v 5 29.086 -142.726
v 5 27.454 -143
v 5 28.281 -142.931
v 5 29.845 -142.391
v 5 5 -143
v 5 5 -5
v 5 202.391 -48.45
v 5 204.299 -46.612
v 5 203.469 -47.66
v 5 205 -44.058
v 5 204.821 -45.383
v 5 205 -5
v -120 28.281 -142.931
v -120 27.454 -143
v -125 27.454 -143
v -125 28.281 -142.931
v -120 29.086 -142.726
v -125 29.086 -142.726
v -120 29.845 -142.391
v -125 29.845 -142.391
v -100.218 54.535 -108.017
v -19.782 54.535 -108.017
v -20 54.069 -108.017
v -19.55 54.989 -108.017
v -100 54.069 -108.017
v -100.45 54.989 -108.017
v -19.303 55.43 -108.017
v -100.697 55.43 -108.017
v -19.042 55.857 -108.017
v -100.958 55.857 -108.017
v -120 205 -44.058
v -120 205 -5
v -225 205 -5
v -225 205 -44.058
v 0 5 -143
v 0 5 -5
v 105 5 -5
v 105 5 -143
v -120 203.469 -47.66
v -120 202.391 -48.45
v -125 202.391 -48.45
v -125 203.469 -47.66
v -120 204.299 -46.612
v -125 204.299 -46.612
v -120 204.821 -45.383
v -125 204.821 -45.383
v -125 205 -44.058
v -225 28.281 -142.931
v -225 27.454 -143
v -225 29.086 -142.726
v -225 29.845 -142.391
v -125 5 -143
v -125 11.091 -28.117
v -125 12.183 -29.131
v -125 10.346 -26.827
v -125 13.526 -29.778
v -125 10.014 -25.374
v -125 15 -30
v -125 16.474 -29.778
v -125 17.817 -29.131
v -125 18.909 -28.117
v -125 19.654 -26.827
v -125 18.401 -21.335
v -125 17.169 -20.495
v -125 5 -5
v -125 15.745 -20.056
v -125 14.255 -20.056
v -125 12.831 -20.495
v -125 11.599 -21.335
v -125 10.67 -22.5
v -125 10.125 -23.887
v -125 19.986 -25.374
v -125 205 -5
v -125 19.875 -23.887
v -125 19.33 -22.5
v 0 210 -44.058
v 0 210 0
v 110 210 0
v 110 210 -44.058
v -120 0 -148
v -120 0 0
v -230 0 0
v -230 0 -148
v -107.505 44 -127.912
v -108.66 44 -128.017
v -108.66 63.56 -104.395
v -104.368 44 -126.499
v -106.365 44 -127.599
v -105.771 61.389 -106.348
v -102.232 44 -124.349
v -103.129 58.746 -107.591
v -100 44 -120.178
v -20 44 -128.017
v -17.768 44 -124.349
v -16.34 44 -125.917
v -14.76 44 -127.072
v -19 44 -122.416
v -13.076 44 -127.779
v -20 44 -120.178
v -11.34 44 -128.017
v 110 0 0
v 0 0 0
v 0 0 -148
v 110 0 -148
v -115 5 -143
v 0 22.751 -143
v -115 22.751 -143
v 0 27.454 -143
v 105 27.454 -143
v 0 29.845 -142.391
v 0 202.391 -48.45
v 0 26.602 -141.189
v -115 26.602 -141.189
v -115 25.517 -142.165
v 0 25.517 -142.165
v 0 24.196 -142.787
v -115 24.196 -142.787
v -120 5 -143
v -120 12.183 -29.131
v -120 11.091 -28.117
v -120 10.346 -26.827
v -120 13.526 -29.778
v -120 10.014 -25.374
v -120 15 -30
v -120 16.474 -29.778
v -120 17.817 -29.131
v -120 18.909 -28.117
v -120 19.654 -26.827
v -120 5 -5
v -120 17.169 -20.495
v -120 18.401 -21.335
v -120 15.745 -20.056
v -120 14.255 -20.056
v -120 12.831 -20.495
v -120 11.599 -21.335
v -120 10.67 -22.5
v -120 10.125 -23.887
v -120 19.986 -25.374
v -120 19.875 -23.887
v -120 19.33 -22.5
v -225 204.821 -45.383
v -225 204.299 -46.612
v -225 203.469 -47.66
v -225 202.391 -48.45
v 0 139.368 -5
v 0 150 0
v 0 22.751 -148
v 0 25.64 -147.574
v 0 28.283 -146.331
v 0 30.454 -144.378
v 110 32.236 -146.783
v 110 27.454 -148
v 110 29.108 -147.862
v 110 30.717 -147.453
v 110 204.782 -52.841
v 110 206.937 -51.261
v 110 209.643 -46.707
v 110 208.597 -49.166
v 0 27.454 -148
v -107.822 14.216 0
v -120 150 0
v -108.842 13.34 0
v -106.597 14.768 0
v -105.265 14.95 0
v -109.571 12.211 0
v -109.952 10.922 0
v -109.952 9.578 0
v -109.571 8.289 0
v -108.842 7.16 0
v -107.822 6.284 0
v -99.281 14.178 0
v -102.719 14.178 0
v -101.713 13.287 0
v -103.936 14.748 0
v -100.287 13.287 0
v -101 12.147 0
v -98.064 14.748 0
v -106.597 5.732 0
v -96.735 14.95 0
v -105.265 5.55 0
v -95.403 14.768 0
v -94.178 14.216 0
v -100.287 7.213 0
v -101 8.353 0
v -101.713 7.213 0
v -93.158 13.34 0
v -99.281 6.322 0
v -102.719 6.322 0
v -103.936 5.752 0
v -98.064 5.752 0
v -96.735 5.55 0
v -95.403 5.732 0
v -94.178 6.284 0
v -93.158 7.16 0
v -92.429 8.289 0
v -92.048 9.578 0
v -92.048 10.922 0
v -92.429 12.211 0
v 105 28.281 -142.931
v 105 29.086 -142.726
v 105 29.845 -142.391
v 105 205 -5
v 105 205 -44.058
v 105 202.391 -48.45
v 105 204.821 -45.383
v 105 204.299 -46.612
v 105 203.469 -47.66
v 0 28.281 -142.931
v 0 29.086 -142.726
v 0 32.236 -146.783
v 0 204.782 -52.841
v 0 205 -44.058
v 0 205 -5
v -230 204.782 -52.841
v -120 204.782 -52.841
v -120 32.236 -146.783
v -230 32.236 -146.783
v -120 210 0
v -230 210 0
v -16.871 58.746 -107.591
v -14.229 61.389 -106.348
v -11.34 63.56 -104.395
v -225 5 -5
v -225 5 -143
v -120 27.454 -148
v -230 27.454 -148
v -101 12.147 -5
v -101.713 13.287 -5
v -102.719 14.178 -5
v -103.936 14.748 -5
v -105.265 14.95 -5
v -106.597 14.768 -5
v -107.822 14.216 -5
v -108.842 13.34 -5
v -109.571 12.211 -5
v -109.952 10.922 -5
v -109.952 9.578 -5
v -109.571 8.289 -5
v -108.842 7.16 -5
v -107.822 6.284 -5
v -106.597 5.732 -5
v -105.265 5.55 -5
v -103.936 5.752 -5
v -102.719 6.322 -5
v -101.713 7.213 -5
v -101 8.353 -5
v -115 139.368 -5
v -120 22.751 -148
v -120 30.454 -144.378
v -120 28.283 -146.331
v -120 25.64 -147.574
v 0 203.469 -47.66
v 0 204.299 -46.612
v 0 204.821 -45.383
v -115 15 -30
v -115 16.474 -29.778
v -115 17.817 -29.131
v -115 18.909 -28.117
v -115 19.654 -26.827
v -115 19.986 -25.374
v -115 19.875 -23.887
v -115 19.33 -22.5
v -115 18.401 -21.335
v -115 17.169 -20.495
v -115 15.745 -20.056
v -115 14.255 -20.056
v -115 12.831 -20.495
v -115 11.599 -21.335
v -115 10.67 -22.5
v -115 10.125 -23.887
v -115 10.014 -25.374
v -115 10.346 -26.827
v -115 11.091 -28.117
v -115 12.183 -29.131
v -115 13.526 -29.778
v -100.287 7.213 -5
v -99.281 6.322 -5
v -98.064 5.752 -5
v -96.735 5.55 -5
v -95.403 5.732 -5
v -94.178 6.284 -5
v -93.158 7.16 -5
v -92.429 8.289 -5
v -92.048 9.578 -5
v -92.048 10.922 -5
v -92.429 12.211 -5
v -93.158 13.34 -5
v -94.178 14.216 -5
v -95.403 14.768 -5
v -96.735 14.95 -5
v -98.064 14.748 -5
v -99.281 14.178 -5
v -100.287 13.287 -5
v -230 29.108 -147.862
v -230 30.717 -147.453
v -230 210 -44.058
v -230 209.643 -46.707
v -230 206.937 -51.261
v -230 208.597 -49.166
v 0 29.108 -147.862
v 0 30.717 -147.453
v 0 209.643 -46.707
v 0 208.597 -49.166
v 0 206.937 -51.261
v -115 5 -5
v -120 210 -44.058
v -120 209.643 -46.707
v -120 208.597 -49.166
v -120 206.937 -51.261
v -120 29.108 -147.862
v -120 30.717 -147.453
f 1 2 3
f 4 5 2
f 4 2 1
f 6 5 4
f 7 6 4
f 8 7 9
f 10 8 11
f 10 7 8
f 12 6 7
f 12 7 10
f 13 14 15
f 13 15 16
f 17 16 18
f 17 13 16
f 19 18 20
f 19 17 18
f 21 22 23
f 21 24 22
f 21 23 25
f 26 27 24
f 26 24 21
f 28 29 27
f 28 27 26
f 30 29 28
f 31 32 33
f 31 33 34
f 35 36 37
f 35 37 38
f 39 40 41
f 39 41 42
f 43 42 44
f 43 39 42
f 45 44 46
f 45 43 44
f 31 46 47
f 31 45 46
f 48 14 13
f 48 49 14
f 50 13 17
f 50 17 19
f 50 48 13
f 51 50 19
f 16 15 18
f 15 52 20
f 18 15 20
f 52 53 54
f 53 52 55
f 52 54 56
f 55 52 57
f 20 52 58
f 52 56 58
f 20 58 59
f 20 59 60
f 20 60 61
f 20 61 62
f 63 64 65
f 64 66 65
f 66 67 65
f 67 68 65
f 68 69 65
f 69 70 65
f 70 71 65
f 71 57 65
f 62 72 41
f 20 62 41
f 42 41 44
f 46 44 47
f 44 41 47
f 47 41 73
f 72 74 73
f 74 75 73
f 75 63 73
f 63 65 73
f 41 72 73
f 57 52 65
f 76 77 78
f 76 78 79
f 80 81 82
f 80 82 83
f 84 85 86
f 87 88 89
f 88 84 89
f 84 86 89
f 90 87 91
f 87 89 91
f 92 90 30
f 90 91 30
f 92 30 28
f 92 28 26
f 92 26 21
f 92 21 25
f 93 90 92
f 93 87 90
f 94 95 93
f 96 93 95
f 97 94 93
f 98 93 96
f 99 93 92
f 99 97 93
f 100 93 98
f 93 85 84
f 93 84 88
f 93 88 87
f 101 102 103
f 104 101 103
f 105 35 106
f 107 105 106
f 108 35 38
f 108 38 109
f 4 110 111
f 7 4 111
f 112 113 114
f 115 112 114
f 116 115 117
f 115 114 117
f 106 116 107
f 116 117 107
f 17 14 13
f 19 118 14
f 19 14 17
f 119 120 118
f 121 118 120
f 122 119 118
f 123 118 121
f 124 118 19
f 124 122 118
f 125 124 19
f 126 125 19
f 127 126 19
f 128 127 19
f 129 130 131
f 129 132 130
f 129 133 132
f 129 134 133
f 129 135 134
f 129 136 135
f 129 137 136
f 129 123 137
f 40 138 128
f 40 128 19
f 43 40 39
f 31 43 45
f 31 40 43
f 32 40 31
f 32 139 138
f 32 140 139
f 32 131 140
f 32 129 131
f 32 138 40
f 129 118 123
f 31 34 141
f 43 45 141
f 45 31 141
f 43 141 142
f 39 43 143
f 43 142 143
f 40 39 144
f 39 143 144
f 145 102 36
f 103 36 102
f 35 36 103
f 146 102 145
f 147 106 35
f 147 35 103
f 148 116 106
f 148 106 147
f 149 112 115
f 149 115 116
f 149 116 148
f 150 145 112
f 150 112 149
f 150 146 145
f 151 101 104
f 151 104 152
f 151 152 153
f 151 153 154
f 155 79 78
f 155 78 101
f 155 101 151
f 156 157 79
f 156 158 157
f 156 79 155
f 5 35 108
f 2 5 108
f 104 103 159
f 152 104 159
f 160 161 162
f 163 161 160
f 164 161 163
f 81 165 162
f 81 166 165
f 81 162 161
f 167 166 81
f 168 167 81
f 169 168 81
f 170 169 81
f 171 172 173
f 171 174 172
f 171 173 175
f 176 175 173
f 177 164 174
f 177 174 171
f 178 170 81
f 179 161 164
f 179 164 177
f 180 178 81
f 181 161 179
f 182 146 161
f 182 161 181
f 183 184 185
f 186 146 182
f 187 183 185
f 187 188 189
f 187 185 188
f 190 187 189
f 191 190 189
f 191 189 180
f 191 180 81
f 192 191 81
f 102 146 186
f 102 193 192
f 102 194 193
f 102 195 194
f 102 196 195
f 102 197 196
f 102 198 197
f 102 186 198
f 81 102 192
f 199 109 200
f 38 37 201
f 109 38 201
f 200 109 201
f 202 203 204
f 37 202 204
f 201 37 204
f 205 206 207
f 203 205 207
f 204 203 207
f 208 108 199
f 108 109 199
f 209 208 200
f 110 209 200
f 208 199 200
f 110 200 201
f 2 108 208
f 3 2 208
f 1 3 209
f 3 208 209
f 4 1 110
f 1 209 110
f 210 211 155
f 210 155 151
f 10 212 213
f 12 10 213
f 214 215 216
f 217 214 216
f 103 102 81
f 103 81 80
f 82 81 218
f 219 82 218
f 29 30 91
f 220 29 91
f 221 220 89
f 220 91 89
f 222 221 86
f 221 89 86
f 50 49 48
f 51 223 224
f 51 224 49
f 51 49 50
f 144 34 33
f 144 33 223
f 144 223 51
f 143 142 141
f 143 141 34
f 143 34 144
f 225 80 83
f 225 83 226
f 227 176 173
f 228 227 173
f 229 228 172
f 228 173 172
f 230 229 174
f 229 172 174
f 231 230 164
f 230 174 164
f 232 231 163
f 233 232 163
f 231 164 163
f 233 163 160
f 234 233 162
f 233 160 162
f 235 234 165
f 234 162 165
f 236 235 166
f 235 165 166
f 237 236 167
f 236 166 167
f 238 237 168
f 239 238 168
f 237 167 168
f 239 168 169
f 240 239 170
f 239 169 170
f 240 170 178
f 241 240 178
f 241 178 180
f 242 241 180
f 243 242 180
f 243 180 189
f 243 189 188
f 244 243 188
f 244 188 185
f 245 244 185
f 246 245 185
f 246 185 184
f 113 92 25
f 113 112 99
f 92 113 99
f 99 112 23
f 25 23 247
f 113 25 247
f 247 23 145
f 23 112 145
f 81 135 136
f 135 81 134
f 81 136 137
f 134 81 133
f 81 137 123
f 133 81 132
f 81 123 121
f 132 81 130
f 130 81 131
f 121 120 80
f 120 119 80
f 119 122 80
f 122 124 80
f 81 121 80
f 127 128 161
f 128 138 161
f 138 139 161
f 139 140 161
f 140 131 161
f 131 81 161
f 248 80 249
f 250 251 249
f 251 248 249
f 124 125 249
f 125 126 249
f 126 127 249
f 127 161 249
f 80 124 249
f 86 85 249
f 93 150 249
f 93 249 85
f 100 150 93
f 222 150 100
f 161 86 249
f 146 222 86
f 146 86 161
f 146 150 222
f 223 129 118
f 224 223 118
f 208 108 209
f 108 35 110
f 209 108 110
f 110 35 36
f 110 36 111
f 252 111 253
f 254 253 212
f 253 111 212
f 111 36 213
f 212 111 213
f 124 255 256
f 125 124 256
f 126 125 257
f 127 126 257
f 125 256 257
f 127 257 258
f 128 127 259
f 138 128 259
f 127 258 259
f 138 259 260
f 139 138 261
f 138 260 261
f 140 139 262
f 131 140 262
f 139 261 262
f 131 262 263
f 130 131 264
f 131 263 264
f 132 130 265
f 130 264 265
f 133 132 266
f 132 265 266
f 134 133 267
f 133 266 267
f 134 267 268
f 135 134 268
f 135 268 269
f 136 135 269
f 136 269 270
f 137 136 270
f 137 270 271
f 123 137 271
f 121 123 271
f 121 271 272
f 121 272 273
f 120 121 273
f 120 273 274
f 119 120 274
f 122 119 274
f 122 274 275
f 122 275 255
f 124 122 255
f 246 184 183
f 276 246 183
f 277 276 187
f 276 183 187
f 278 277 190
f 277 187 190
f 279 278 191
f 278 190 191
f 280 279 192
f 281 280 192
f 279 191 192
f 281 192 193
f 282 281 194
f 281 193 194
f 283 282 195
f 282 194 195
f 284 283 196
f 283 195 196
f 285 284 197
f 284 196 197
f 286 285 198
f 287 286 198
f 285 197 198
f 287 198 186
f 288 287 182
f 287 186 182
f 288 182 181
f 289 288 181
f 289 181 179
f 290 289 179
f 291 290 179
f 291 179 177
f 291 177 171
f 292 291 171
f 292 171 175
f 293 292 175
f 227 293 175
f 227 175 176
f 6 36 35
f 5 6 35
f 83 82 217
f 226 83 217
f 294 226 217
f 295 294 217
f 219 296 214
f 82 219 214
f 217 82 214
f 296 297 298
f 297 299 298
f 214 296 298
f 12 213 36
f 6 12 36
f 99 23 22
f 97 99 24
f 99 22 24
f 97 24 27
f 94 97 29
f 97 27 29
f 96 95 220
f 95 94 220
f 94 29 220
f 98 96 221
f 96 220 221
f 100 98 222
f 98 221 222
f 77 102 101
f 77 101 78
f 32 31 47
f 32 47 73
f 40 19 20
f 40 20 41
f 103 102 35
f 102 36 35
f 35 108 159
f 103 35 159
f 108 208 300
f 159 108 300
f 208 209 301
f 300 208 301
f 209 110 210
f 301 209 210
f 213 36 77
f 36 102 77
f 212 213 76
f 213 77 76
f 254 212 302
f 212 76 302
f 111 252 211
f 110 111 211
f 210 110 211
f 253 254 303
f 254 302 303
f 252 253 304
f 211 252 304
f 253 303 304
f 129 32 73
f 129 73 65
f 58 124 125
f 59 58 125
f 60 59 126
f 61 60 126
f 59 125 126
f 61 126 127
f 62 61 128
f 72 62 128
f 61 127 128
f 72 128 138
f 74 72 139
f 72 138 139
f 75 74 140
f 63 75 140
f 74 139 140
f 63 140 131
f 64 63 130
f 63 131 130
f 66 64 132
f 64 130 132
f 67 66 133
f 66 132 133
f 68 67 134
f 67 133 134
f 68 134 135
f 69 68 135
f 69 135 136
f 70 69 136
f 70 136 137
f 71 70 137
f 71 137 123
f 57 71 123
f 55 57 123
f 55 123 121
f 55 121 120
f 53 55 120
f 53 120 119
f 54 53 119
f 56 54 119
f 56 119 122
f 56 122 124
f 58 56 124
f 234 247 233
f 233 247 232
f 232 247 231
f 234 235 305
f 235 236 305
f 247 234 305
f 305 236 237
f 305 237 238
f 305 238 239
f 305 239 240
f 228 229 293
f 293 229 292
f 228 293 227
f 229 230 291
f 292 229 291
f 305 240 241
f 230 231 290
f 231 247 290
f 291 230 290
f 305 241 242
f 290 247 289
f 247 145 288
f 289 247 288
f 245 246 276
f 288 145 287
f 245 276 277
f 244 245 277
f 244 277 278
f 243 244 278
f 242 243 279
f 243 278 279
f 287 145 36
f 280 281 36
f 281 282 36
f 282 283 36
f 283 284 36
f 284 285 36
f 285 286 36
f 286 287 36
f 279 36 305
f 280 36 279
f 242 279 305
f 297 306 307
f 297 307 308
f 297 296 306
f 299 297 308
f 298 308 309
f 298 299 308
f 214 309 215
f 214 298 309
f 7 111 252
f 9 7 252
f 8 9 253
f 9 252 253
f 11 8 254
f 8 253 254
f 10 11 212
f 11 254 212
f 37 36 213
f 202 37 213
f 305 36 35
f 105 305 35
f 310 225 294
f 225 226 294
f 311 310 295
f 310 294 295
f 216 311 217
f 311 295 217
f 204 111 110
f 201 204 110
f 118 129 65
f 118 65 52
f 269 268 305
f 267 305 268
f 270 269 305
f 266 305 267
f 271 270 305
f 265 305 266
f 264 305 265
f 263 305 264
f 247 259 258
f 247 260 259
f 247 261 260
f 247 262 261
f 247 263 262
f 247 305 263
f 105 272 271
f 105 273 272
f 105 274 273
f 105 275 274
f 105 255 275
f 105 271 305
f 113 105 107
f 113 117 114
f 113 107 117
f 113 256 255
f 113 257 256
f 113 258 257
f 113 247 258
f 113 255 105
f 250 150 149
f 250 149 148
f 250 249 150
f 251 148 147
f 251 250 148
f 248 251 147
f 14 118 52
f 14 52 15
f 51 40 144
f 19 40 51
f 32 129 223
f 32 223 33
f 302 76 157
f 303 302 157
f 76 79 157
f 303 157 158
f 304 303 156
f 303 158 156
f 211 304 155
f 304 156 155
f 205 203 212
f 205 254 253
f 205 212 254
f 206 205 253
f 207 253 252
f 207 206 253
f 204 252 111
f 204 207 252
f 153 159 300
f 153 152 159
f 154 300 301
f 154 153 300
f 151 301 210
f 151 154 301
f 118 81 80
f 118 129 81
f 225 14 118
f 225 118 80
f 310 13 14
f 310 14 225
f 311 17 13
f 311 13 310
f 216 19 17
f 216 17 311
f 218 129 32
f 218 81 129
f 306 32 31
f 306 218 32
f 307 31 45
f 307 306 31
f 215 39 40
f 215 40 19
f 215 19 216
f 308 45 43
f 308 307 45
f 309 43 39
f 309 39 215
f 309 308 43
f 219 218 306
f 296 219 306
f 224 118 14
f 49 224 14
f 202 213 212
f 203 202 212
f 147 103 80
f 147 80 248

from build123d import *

# Parameters (mm, degrees)
SKETCH1_W               = 148
SKETCH1_H               = 210
BOSS_EXTRUDE1_DEPTH     = 110
SPLIT1_SURFACE_1_BACK   = 280.471
SPLIT1_SURFACE_1_DEPTH  = 560.942
FILLET1_R               = 10
SHELL2_T                = -5
THICKEN1_DEPTH          = 5
BOSS_EXTRUDE2_DEPTH     = 120
FILLET2_R               = 10
SHELL3_T                = -5
SKETCH4_R               = 5
CUT_EXTRUDE1_DEPTH      = 10
CUT_EXTRUDE2_DEPTH      = 5
CUT_EXTRUDE3_DEPTH      = 40
CUT_EXTRUDE3_DEPTH_BACK = 40
FILLET3_R               = 10


# Read off the part's stored shape, not the designer's step: Thicken1
with BuildPart() as part:
    # Sketch1 → Boss-Extrude1 (new body)
    with BuildSketch(Plane(origin=(0, 0, 0), x_dir=(0, 0, -1), z_dir=(1, 0, 0))):
        with Locations((74, 105)):
            Rectangle(SKETCH1_W, SKETCH1_H)
    extrude(amount=BOSS_EXTRUDE1_DEPTH)

    # Split1: cut with a surface, the side behind it stays
    # Split1 surface: a surface, the sketch's curves swept straight by 560.942 mm
    with BuildLine(Plane(origin=(110, 0, 0), x_dir=(0, 0, -1), z_dir=(1, 0, 0)).offset(-SPLIT1_SURFACE_1_BACK), mode=Mode.PRIVATE) as split1_surface_1_path:
        Line((50, 210), (148, 30))
    split1_surface_1 = Shell.extrude(split1_surface_1_path.wire(), (1 * SPLIT1_SURFACE_1_DEPTH, 0 * SPLIT1_SURFACE_1_DEPTH, 0 * SPLIT1_SURFACE_1_DEPTH))
    split(bisect_by=split1_surface_1, keep=Keep.BOTTOM)

    # Fillet1
    fillet1_edges = [part.edges().sort_by_distance(p)[0] for p in [
        (55, 210, -50),
        (55, 30, -148),
    ]]
    fillet(fillet1_edges, radius=FILLET1_R)

    # Shell2
    shell2_openings = [part.faces().sort_by_distance(p)[0] for p in [
        (0, 87.139420884, -57.622655137),
    ]]
    offset(amount=SHELL2_T, openings=shell2_openings, kind=Kind.INTERSECTION)


with BuildPart() as body_2:
    # Thicken1 outline → Thicken1 (new body)
    with BuildSketch(Plane.YZ):
        with BuildLine():
            ThreePointArc((27.454206726, -143), (28.68775727, -142.845446631), (29.845048058, -142.391341222))
            Line((29.845048058, -142.391341222), (202.390841332, -48.449742661))
            ThreePointArc((202.390841332, -48.449742661), (204.298500126, -46.612397656), (205, -44.05840144))
            Line((205, -44.05840144), (205, -5))
            Line((205, -5), (5, -5))
            Line((5, -5), (5, -143))
            Line((5, -143), (27.454206726, -143))
        make_face()
    extrude(amount=THICKEN1_DEPTH)


with BuildPart() as body_3:
    # Mirror1: mirrored copy
    add(part.part.mirror(Plane(origin=(-60, 0, 0), x_dir=(0, 0, 1), z_dir=(1, 0, 0))))


with BuildPart() as body_4:
    # Mirror1 2: mirrored copy
    add(body_2.part.mirror(Plane(origin=(-60, 0, 0), x_dir=(0, 0, 1), z_dir=(1, 0, 0))))


with BuildPart() as body_5:
    # Sketch3 → Boss-Extrude2 (new body)
    with BuildSketch(Plane.ZY):
        Polygon((-148, 27.454206726), (0, 150), (0, 0), (-148, 0), align=None)
    extrude(amount=BOSS_EXTRUDE2_DEPTH)

    # Fillet2
    fillet2_edges = [body_5.edges().sort_by_distance(p)[0] for p in [
        (-60, 27.454206726, -148),
    ]]
    fillet(fillet2_edges, radius=FILLET2_R)

    # Shell3
    shell3_openings = [body_5.faces().sort_by_distance(p)[0] for p in [
        (0, 51.421511448, -56.944660016),
    ]]
    offset(amount=SHELL3_T, openings=shell3_openings, kind=Kind.INTERSECTION)


with BuildPart() as cut_extrude1_tool:
    # Sketch4 → Cut-Extrude1 (new body)
    with BuildSketch(Plane(origin=(-115, 0, 0), x_dir=(0, 0, -1), z_dir=(1, 0, 0))):
        with Locations((25, 15)):
            Circle(SKETCH4_R)
    extrude(amount=-CUT_EXTRUDE1_DEPTH)


with BuildPart() as body_4_1:
    add(body_4.part)

    # Cut-Extrude1: cut by cut_extrude1_tool
    add(cut_extrude1_tool.part, mode=Mode.SUBTRACT)


with BuildPart() as body_5_1:
    add(body_5.part)

    # Cut-Extrude1: cut by cut_extrude1_tool
    add(cut_extrude1_tool.part, mode=Mode.SUBTRACT)

    # Sketch5 → Cut-Extrude2 (cut)
    with BuildSketch(Plane.XY):
        with BuildLine():
            ThreePointArc((-101, 12.147366596), (-110, 10.25), (-101, 8.352633404))
            ThreePointArc((-101, 8.352633404), (-92, 10.25), (-101, 12.147366596))
        make_face()
    extrude(amount=-CUT_EXTRUDE2_DEPTH, mode=Mode.SUBTRACT)

    # Sketch7 → Cut-Extrude3 (cut, two sides: drawn at the far end of the back side and taken through both)
    with BuildSketch(Plane(origin=(-60, 0, 0), x_dir=(0, 0, -1), z_dir=(1, 0, 0)).offset(-CUT_EXTRUDE3_DEPTH_BACK)):
        Polygon((128.0174503, 44), (108.0174503, 44), (108.0174503, 60.560242334), align=None)
    extrude(amount=CUT_EXTRUDE3_DEPTH + CUT_EXTRUDE3_DEPTH_BACK, mode=Mode.SUBTRACT)

    # Fillet3
    # the kernel refuses this fillet: 10 mm, written as the material it takes off along each edge
    with BuildSketch(Plane(origin=(-100, 74.368203197, -91.341413097), x_dir=(-1, 0, 0), z_dir=(0, -0.6377623937017006, -0.77023316546347))) as fillet3_piece_1_section:
        with BuildLine():
            CenterArc((8.660254038, -10), FILLET3_R, 90, 60)
            Line((0, -5), (-0.173205081, -4.9))
            ThreePointArc((-0.173205081, -4.9), (-0.2, -2.5), (-0.2, 0))
            Line((-0.2, 0), (0, 0.2))
            Line((0, 0.2), (8.660254038, 0.2))
            Line((8.660254038, 0.2), (8.660254038, 0))
        make_face()
    fillet3_piece_1 = extrude(amount=69.26743329, mode=Mode.PRIVATE)
    fillet3_piece_1 = split(fillet3_piece_1, bisect_by=Plane(origin=(-102.283215667, 51.522014341, -108.0174503), z_dir=(0, 0, -1)), keep=Keep.TOP, mode=Mode.PRIVATE)
    fillet3_piece_1 = split(fillet3_piece_1, bisect_by=Plane(origin=(-102.283215667, 44, -117.101875744), z_dir=(0, 1, 0)), keep=Keep.TOP, mode=Mode.PRIVATE)
    with BuildSketch(Plane(origin=(-20, 74.368203197, -91.341413097), x_dir=(1, 0, 0), z_dir=(0, -0.6377623937017006, -0.77023316546347))) as fillet3_piece_2_section:
        with BuildLine():
            CenterArc((8.660254038, 10), FILLET3_R, 210, 60)
            Line((0, 5), (-0.173205081, 4.9))
            ThreePointArc((-0.173205081, 4.9), (-0.2, 2.5), (-0.2, 0))
            Line((-0.2, 0), (0, -0.2))
            Line((0, -0.2), (8.660254038, -0.2))
            Line((8.660254038, -0.2), (8.660254038, 0))
        make_face()
    fillet3_piece_2 = extrude(amount=69.26743329, mode=Mode.PRIVATE)
    fillet3_piece_2 = split(fillet3_piece_2, bisect_by=Plane(origin=(-17.716784333, 51.522014341, -108.0174503), z_dir=(0, 0, -1)), keep=Keep.TOP, mode=Mode.PRIVATE)
    fillet3_piece_2 = split(fillet3_piece_2, bisect_by=Plane(origin=(-17.716784333, 44, -117.101875744), z_dir=(0, 1, 0)), keep=Keep.TOP, mode=Mode.PRIVATE)
    with BuildSketch(Plane(origin=(-100, 60.560242334, -108.0174503), x_dir=(0, 0.6377623937017001, 0.7702331654634703), z_dir=(1, 0, 0))) as fillet3_piece_3:
        with BuildLine():
            CenterArc((FILLET3_R * 0.470296038318, FILLET3_R), FILLET3_R, 219.625168474, 50.374831526)
            Line((-FILLET3_R * 0.299937127146, FILLET3_R * 0.362237606298), (-FILLET3_R * 0.315341790455, FILLET3_R * 0.349482358424))
            Line((-FILLET3_R * 0.315341790455, FILLET3_R * 0.349482358424), (-FILLET3_R * 0.00940592076635, -FILLET3_R * 0.02))
            Line((-FILLET3_R * 0.00940592076635, -FILLET3_R * 0.02), (FILLET3_R * 0.470296038318, -FILLET3_R * 0.02))
            Line((FILLET3_R * 0.470296038318, -FILLET3_R * 0.02), (FILLET3_R * 0.470296038318, 0))
        make_face()
    fillet3_piece_3_solid = extrude(amount=80, mode=Mode.PRIVATE)
    with BuildSketch(Plane(origin=(-100, 74.368203197, -91.341413097), x_dir=(-1, 0, 0), z_dir=(0, -0.6377623937017006, -0.77023316546347))) as fillet3_piece_4a_section:
        with BuildLine():
            CenterArc((8.660254038, -10), FILLET3_R, 90, 60)
            Line((0, -5), (-0.173205081, -4.9))
            ThreePointArc((-0.173205081, -4.9), (-0.2, -2.5), (-0.2, 0))
            Line((-0.2, 0), (0, 0.2))
            Line((0, 0.2), (8.660254038, 0.2))
            Line((8.660254038, 0.2), (8.660254038, 0))
        make_face()
    fillet3_piece_4a = extrude(amount=69.26743329, mode=Mode.PRIVATE)
    fillet3_piece_4a = split(fillet3_piece_4a, bisect_by=Plane(origin=(-102.112946333, 66.069674888, -108.0174503), z_dir=(0, 0, 1)), keep=Keep.TOP, mode=Mode.PRIVATE)
    with BuildSketch(Plane(origin=(-111.757400958, 60.560242334, -108.0174503), x_dir=(0, 0.6377623937017026, 0.7702331654634684), z_dir=(1, 0, 0))) as fillet3_piece_4b_section:
        with BuildLine():
            CenterArc((FILLET3_R * 0.470296038318, FILLET3_R), FILLET3_R, 219.625168474, 50.374831526)
            Line((-FILLET3_R * 0.299937127146, FILLET3_R * 0.362237606298), (-FILLET3_R * 0.315341790455, FILLET3_R * 0.349482358424))
            Line((-FILLET3_R * 0.315341790455, FILLET3_R * 0.349482358424), (-FILLET3_R * 0.00940592076635, -FILLET3_R * 0.02))
            Line((-FILLET3_R * 0.00940592076635, -FILLET3_R * 0.02), (FILLET3_R * 0.470296038318, -FILLET3_R * 0.02))
            Line((FILLET3_R * 0.470296038318, -FILLET3_R * 0.02), (FILLET3_R * 0.470296038318, 0))
        make_face()
    fillet3_piece_4b = extrude(amount=91.757400958, mode=Mode.PRIVATE)
    fillet3_piece_4b = split(fillet3_piece_4b, bisect_by=Plane(origin=(-100, 60.196176362, -107.243329443), z_dir=(-1, 0, 0)), keep=Keep.TOP, mode=Mode.PRIVATE)
    fillet3_piece_4 = fillet3_piece_4a & fillet3_piece_4b
    with BuildSketch(Plane(origin=(-100, 60.560242334, -108.0174503), x_dir=(0, 0.6377623937017001, 0.7702331654634703), z_dir=(1, 0, 0))) as fillet3_piece_5a_section:
        with BuildLine():
            CenterArc((FILLET3_R * 0.470296038318, FILLET3_R), FILLET3_R, 219.625168474, 50.374831526)
            Line((-FILLET3_R * 0.299937127146, FILLET3_R * 0.362237606298), (-FILLET3_R * 0.315341790455, FILLET3_R * 0.349482358424))
            Line((-FILLET3_R * 0.315341790455, FILLET3_R * 0.349482358424), (-FILLET3_R * 0.00940592076635, -FILLET3_R * 0.02))
            Line((-FILLET3_R * 0.00940592076635, -FILLET3_R * 0.02), (FILLET3_R * 0.470296038318, -FILLET3_R * 0.02))
            Line((FILLET3_R * 0.470296038318, -FILLET3_R * 0.02), (FILLET3_R * 0.470296038318, 0))
        make_face()
    fillet3_piece_5a = extrude(amount=91.757400958, mode=Mode.PRIVATE)
    fillet3_piece_5a = split(fillet3_piece_5a, bisect_by=Plane(origin=(-20, 60.196176362, -107.243329443), z_dir=(1, 0, 0)), keep=Keep.TOP, mode=Mode.PRIVATE)
    with BuildSketch(Plane(origin=(-20, 74.368203197, -91.341413097), x_dir=(1, 0, 0), z_dir=(0, -0.6377623937017006, -0.77023316546347))) as fillet3_piece_5b_section:
        with BuildLine():
            CenterArc((8.660254038, 10), FILLET3_R, 210, 60)
            Line((0, 5), (-0.173205081, 4.9))
            ThreePointArc((-0.173205081, 4.9), (-0.2, 2.5), (-0.2, 0))
            Line((-0.2, 0), (0, -0.2))
            Line((0, -0.2), (8.660254038, -0.2))
            Line((8.660254038, -0.2), (8.660254038, 0))
        make_face()
    fillet3_piece_5b = extrude(amount=69.26743329, mode=Mode.PRIVATE)
    fillet3_piece_5b = split(fillet3_piece_5b, bisect_by=Plane(origin=(-17.887053667, 66.069674888, -108.0174503), z_dir=(0, 0, 1)), keep=Keep.TOP, mode=Mode.PRIVATE)
    fillet3_piece_5 = fillet3_piece_5a & fillet3_piece_5b
    add([fillet3_piece_1, fillet3_piece_2, fillet3_piece_3_solid, fillet3_piece_4, fillet3_piece_5], mode=Mode.SUBTRACT)


solid = Compound([part.part, body_2.part, body_3.part, body_4_1.part, body_5_1.part])
